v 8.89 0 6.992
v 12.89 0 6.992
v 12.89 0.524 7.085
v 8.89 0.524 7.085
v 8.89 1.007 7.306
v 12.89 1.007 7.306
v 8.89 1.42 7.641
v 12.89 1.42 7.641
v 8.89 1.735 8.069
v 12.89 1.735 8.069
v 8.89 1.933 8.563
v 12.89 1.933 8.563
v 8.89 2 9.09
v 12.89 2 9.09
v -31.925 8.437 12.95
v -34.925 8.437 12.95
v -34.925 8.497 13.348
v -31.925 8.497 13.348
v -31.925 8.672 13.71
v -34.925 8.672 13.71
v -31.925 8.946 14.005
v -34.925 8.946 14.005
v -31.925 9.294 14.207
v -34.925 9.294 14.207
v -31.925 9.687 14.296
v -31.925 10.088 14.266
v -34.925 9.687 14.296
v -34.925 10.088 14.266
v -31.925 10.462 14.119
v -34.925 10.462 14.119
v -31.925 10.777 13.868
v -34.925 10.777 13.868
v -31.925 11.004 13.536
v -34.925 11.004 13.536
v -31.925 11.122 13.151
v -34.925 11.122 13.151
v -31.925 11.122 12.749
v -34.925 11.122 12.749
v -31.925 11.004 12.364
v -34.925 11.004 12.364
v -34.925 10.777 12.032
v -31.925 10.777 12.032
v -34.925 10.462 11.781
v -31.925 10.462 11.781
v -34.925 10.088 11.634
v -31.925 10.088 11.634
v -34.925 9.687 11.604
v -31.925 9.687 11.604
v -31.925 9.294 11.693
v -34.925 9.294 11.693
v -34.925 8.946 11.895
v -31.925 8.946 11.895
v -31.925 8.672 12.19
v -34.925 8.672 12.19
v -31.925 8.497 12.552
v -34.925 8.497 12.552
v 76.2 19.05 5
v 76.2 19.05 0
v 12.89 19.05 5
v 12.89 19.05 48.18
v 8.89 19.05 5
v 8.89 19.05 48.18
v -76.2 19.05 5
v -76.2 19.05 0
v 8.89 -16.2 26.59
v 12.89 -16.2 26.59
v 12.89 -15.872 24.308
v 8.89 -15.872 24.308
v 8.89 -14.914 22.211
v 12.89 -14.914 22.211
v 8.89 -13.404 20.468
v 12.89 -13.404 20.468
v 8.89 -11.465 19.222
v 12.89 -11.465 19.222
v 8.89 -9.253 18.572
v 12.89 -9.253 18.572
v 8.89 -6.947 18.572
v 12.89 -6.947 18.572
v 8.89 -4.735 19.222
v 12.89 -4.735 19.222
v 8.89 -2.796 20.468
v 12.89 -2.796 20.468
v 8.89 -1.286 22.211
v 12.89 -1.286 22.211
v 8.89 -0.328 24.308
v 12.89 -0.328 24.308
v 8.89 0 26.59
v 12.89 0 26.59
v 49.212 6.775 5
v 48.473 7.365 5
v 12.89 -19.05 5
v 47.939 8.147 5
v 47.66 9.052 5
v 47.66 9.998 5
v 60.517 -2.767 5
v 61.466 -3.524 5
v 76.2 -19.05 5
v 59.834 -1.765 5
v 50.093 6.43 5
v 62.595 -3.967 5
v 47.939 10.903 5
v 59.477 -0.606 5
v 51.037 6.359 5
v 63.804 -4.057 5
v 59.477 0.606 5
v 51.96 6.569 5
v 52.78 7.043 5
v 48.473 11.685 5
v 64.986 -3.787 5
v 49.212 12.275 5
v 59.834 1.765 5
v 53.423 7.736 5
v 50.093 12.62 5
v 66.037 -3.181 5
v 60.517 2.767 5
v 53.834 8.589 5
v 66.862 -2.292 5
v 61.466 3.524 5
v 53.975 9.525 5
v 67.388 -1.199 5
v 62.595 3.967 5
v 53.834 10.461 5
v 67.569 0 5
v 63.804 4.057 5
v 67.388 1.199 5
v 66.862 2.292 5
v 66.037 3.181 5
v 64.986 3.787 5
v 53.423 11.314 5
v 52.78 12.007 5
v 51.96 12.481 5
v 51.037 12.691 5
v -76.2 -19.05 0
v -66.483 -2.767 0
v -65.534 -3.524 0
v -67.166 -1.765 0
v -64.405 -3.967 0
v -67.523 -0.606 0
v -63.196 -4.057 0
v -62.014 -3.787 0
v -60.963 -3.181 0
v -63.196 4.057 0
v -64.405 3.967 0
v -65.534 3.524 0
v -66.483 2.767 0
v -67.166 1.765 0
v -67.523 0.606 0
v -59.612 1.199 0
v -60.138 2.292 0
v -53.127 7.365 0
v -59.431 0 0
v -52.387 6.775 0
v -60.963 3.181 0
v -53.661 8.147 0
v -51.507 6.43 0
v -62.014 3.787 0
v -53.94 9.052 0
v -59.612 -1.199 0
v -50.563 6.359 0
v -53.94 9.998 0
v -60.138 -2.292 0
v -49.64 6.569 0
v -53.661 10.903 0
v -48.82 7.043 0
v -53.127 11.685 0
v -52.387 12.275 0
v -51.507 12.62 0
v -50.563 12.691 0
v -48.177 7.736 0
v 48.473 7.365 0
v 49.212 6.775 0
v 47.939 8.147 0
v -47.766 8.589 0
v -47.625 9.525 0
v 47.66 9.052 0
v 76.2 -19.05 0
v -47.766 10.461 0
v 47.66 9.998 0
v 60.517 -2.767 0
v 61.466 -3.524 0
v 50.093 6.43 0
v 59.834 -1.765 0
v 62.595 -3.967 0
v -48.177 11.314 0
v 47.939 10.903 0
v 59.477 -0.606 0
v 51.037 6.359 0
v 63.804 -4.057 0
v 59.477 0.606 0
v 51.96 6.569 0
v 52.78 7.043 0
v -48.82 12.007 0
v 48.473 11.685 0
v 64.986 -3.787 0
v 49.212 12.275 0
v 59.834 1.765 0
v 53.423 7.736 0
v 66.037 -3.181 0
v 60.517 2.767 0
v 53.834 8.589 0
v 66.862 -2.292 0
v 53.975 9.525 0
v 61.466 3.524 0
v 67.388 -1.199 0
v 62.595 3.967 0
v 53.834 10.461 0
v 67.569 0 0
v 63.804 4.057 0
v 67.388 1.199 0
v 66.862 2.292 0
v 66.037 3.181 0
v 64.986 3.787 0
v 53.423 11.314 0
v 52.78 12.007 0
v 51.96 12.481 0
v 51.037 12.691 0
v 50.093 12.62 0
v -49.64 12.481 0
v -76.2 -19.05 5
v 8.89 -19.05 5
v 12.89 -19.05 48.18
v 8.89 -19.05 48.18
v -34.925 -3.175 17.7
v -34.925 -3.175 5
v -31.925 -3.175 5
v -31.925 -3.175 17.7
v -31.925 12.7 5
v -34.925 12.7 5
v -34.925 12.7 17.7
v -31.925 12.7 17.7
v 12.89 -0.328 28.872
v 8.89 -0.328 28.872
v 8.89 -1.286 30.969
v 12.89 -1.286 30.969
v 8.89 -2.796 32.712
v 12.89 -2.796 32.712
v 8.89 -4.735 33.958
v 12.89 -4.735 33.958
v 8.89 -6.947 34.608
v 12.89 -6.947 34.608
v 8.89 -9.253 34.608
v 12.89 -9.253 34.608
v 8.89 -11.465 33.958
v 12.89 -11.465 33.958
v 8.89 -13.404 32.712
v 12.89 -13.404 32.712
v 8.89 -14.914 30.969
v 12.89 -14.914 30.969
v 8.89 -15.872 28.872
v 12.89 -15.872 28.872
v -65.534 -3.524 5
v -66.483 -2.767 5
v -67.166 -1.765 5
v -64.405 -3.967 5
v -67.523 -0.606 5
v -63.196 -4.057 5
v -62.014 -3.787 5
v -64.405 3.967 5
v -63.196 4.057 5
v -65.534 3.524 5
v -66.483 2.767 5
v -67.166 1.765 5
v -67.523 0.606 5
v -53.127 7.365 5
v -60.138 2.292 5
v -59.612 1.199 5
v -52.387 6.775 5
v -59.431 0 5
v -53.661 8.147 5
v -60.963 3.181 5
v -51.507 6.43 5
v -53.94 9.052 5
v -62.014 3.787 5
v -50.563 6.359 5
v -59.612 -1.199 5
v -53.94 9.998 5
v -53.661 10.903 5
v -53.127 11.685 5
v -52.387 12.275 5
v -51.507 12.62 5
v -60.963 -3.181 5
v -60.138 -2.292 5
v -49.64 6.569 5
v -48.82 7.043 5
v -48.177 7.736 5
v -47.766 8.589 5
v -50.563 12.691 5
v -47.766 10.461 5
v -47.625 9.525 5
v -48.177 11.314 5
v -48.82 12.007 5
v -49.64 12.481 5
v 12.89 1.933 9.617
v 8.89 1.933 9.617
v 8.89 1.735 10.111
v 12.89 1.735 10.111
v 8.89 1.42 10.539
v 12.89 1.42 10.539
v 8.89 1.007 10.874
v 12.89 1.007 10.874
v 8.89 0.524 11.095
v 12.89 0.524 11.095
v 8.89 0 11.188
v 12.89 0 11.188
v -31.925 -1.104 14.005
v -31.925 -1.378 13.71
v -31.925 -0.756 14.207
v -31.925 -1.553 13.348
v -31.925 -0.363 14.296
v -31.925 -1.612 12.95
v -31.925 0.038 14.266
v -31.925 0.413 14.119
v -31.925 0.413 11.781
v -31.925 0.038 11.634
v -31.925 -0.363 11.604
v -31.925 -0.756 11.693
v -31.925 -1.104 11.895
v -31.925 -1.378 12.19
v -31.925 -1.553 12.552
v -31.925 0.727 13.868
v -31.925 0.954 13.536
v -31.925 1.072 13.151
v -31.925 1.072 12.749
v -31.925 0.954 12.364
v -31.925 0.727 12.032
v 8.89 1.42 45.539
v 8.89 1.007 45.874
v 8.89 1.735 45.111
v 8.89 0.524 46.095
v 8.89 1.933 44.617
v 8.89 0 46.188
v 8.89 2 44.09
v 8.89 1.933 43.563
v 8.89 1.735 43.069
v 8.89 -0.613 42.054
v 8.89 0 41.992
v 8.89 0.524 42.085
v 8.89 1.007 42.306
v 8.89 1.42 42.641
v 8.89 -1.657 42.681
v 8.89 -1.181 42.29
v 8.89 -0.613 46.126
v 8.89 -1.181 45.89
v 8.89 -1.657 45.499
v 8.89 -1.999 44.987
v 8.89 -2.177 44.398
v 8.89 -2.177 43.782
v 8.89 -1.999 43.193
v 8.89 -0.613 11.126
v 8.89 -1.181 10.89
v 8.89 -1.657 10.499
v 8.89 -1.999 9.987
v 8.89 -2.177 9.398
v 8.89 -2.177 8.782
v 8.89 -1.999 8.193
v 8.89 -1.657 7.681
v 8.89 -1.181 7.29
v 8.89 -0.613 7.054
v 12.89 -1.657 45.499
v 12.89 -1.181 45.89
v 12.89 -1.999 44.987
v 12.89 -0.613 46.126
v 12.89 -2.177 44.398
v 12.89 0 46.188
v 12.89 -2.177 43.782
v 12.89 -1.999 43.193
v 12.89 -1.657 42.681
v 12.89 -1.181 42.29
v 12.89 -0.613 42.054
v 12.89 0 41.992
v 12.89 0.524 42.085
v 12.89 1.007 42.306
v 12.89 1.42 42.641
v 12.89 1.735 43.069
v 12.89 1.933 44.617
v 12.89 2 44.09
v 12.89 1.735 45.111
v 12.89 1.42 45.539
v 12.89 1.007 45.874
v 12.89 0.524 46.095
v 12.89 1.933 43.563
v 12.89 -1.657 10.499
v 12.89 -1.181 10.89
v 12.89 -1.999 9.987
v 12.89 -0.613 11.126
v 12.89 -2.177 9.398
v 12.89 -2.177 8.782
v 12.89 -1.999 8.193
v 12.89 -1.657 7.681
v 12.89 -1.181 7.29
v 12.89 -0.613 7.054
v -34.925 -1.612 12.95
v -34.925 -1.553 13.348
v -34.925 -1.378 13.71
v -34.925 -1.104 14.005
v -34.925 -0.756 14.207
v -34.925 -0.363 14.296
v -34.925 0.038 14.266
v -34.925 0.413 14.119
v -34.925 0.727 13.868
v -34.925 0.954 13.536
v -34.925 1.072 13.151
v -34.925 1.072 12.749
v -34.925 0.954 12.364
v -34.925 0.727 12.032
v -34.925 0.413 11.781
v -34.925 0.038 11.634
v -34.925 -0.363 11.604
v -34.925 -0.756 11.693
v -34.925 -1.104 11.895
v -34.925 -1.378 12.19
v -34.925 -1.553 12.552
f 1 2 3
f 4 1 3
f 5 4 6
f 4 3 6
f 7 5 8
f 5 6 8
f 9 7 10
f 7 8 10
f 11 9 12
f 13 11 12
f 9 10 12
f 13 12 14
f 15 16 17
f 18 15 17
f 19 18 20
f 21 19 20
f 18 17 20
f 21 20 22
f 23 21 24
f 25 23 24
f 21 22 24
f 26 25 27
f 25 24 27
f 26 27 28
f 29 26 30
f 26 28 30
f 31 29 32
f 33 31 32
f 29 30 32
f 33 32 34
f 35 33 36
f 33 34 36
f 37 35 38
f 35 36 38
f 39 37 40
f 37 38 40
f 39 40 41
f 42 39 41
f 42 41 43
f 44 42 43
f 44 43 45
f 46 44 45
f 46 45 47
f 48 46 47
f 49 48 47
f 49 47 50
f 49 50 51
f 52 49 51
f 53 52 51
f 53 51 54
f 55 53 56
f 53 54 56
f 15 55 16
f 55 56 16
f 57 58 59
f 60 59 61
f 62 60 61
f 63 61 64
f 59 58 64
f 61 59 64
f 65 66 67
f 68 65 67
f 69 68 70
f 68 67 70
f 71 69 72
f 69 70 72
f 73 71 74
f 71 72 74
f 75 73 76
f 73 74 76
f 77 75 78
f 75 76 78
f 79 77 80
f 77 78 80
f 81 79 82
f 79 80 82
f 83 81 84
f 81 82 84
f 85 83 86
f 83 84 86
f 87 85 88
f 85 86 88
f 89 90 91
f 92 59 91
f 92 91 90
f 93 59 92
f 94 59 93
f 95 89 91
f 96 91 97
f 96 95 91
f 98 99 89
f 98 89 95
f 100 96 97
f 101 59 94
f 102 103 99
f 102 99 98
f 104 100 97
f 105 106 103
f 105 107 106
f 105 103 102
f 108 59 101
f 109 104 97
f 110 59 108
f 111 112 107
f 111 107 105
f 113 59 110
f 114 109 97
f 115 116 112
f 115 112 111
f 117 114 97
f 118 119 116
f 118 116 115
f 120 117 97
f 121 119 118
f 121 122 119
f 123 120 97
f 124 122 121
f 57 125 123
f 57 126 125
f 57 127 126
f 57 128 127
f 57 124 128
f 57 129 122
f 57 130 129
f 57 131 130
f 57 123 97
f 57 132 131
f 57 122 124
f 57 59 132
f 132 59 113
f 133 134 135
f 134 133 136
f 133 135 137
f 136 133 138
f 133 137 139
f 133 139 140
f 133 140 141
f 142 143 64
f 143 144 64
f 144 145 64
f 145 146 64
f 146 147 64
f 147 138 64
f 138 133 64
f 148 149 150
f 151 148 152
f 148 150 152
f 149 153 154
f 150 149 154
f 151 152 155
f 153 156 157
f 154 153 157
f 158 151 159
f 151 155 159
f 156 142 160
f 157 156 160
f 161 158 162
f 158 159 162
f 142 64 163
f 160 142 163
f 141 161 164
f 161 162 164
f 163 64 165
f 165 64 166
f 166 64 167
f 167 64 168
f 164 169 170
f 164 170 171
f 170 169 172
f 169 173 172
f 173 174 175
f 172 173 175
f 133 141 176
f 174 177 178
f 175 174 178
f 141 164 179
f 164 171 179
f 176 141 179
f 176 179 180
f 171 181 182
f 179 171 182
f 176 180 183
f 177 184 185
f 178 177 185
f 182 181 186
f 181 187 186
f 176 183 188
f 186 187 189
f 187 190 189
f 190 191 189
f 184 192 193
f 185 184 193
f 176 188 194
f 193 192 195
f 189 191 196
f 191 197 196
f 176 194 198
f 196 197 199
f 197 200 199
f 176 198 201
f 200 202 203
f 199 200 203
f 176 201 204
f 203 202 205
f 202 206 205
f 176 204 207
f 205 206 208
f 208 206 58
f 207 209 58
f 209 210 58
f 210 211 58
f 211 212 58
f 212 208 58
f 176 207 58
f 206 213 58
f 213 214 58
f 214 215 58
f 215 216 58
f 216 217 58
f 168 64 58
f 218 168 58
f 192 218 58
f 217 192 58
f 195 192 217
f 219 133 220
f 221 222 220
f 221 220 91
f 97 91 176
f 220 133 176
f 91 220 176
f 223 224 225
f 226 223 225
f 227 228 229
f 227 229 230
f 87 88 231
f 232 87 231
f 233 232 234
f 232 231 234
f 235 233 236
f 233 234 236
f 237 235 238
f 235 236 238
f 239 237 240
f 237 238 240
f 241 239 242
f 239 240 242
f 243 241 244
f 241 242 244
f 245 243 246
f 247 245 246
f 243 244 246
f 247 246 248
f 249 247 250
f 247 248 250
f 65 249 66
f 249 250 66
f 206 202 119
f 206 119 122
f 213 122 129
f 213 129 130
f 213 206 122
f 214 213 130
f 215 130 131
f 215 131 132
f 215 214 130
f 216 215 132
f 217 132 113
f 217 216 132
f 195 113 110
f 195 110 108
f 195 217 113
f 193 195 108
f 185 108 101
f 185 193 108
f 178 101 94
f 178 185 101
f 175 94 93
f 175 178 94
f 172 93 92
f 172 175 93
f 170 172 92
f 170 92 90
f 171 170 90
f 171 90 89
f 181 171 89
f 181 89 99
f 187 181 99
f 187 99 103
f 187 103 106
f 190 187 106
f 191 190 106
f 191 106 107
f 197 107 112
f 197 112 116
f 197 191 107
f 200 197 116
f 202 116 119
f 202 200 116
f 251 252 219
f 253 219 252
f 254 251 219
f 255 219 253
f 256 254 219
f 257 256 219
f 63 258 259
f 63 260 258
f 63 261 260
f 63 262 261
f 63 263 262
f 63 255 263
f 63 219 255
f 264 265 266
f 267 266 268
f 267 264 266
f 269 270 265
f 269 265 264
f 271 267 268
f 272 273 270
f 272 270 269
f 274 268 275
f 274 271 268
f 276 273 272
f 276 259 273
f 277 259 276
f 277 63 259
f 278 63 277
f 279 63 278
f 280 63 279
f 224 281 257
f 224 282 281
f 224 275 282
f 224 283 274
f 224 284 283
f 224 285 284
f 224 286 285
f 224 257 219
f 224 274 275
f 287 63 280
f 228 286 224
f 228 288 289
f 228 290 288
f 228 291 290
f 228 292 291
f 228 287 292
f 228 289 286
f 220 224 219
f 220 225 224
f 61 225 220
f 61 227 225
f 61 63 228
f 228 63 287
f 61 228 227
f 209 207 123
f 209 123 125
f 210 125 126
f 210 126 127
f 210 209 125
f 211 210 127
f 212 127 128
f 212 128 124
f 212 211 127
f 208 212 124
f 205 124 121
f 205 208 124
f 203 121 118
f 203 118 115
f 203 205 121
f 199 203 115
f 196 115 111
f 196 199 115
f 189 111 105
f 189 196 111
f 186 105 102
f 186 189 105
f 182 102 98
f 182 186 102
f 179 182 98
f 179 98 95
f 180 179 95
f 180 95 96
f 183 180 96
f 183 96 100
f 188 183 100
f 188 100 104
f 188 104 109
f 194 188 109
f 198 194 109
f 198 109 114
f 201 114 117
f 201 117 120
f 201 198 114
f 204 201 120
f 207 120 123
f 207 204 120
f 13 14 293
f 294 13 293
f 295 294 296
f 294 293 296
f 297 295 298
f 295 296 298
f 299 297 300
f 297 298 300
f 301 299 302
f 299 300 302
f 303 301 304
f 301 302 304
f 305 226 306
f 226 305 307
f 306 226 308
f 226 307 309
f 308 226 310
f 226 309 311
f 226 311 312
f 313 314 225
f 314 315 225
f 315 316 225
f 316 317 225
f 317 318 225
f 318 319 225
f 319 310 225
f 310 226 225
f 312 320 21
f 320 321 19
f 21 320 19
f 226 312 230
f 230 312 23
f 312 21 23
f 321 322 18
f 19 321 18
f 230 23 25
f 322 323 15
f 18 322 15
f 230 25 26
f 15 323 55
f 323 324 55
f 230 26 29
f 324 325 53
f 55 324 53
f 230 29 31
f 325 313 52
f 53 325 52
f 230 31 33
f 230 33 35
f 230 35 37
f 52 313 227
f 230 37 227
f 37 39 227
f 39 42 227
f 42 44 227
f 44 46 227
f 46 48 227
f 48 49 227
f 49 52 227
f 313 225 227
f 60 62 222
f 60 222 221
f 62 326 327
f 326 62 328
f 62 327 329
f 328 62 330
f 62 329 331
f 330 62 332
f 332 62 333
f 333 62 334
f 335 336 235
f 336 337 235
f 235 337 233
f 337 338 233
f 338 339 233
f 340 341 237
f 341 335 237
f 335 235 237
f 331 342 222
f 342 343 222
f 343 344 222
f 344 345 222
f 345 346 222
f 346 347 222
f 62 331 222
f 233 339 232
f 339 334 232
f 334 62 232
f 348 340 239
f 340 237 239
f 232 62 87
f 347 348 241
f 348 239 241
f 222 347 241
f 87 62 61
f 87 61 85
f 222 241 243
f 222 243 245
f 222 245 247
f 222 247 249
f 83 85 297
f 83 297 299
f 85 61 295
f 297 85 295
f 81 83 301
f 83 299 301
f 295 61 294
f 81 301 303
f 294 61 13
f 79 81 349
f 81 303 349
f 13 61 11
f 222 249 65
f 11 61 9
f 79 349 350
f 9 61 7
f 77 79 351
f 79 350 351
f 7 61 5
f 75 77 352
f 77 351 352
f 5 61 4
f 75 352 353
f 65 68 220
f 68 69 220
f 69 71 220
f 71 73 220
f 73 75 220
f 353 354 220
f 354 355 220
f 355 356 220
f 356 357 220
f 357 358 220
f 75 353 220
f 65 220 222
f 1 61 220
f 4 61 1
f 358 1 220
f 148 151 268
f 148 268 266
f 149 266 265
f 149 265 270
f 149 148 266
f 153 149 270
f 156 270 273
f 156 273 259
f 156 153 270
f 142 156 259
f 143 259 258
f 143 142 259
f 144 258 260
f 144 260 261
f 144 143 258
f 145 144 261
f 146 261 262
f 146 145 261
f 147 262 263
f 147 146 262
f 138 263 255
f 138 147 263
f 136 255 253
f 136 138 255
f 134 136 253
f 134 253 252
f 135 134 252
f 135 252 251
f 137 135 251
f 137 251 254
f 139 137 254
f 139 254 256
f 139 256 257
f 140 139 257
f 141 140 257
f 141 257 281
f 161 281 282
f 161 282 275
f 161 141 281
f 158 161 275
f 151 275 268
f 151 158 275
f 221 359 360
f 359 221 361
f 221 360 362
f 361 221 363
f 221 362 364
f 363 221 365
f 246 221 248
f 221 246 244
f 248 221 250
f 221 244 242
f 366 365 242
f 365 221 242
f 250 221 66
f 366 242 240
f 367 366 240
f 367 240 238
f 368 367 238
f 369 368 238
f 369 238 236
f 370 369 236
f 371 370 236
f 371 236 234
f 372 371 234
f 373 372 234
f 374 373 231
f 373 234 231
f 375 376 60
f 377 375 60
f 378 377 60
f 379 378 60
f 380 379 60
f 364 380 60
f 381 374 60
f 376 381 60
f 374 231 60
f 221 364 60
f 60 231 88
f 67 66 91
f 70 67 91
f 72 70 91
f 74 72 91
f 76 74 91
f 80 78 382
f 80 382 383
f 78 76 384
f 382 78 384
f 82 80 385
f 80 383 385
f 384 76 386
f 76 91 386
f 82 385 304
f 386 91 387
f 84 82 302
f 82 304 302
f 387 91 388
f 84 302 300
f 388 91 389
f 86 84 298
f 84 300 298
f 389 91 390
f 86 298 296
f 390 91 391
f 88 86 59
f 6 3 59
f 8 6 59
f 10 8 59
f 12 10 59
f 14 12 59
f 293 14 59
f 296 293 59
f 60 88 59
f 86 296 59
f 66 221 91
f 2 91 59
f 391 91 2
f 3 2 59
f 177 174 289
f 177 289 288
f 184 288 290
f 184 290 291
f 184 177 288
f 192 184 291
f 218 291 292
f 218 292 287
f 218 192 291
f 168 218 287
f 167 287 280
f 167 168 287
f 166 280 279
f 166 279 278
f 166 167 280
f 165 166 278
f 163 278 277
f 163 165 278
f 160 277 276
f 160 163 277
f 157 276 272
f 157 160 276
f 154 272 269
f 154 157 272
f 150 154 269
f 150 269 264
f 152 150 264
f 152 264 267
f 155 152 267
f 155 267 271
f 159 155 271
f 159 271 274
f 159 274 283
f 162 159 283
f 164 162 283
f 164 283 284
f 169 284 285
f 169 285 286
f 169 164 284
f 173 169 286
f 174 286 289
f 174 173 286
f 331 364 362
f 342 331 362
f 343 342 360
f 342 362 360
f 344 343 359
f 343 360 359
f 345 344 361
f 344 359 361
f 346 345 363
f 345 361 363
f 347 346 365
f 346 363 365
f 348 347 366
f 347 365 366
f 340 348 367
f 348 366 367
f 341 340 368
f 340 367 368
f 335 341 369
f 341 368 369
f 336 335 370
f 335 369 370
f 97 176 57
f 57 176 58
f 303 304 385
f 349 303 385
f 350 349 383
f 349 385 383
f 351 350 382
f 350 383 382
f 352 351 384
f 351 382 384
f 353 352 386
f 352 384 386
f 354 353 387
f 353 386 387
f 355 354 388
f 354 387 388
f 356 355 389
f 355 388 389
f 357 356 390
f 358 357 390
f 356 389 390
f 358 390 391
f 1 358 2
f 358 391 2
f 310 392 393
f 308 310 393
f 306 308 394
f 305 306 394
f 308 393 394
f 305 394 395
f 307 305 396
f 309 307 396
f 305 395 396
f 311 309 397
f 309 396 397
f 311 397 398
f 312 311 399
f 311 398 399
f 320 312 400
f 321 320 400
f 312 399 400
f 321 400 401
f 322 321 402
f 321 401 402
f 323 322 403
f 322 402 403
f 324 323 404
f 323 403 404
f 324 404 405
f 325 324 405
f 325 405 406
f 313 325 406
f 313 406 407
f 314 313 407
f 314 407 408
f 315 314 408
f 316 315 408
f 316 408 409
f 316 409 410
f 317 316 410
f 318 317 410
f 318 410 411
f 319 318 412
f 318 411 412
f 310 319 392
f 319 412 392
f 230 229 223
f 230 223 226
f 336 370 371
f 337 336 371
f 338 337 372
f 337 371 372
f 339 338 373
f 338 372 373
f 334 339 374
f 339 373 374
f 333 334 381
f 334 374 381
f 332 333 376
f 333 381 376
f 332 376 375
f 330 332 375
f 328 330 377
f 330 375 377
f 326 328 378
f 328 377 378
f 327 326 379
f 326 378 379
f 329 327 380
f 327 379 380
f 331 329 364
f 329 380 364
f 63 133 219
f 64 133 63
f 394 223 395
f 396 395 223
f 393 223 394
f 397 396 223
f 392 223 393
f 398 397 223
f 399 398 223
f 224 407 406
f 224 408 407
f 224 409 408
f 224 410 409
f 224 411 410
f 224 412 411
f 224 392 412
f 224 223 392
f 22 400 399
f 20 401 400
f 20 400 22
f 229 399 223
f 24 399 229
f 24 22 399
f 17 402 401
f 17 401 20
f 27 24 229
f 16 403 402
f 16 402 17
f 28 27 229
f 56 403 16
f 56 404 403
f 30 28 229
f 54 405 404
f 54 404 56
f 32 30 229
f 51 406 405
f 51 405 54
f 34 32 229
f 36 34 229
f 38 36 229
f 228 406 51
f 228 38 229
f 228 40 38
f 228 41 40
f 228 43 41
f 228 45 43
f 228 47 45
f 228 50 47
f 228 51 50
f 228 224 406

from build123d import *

# Parameters (mm, degrees)
F0_W     = 76.2
F0_H     = 38.1
F0_R     = 4.06875
F0_R_2   = 3.175
F1_DEPTH = 5
F2_W     = 4
F2_H     = 19.05
F3_DEPTH = 43.18
F4_W     = 3
F4_H     = 15.875
F5_DEPTH = 12.7
F7_DEPTH = 4
F8_R     = 1.349997
F9_DEPTH = 3


with BuildPart() as f1:
    # F0 (on Top) → F1 (new body)
    with BuildSketch(Plane.XY):
        with Locations((38.1, 0)):
            Rectangle(F0_W, F0_H)
        with Locations((63.5, 0)):
            Circle(F0_R, mode=Mode.SUBTRACT)
        with Locations((50.8, 9.525)):
            Circle(F0_R_2, mode=Mode.SUBTRACT)
        with Locations((-38.1, 0)):
            Rectangle(F0_W, F0_H)
        with Locations((-63.5, 0)):
            Circle(F0_R, mode=Mode.SUBTRACT)
        with Locations((-50.8, 9.525)):
            Circle(F0_R_2, mode=Mode.SUBTRACT)
    extrude(amount=F1_DEPTH)

    # F2 (on face) → F3 (join)
    with BuildSketch(Plane.XY.offset(5)):
        with Locations((10.89, 9.525)):
            Rectangle(F2_W, F2_H)
        with Locations((10.89, -9.525)):
            Rectangle(F2_W, F2_H)
    extrude(amount=F3_DEPTH)

    # F4 (on face) → F5 (join)
    with BuildSketch(Plane.XY.offset(5)):
        with Locations((-33.425, 4.7625)):
            Rectangle(F4_W, F4_H)
    extrude(amount=F5_DEPTH)

    # F6 (on face) → F7 (cut, through all)
    with BuildSketch(Plane.YZ.offset(12.89)):
        with BuildLine():
            Line((-8.099996, 26.59), (1.3e-05, 26.59))
            ThreePointArc((1.3e-05, 26.59), (-8.099996, 34.690009), (-16.200006, 26.59))
            Line((-16.200006, 26.59), (-8.099996, 26.59))
        make_face()
        with BuildLine():
            ThreePointArc((-16.200006, 26.59), (-8.099996, 18.489991), (1.3e-05, 26.59))
            Line((1.3e-05, 26.59), (-8.099996, 26.59))
            Line((-8.099996, 26.59), (-16.200006, 26.59))
        make_face()
        with BuildLine():
            ThreePointArc((0, 46.187605), (-2.199983, 44.08999), (0, 41.992376))
            Line((0, 41.992376), (0, 46.187605))
        make_face()
        with BuildLine():
            Line((0, 46.187605), (0, 41.992376))
            ThreePointArc((0, 41.992376), (1.419874, 42.640851), (2.000009, 44.08999))
            ThreePointArc((2.000009, 44.08999), (1.419874, 45.53913), (0, 46.187605))
        make_face()
        with BuildLine():
            ThreePointArc((2.000009, 9.09001), (1.419874, 10.539149), (0, 11.187624))
            Line((0, 11.187624), (0, 6.992395))
            ThreePointArc((0, 6.992395), (1.419874, 7.64087), (2.000009, 9.09001))
        make_face()
        with BuildLine():
            Line((0, 6.992395), (0, 11.187624))
            ThreePointArc((0, 11.187624), (-2.199983, 9.09001), (0, 6.992395))
        make_face()
    extrude(amount=-F7_DEPTH, mode=Mode.SUBTRACT)

    # F8 (on face) → F9 (cut, through all)
    with BuildSketch(Plane(origin=(-34.925, 0, 0), x_dir=(0, -1, 0), z_dir=(-1, 0, 0))):
        with Locations((-9.787496, 12.949984)):
            Circle(F8_R)
        with Locations((0.262496, 12.949984)):
            Circle(F8_R)
    extrude(amount=-F9_DEPTH, mode=Mode.SUBTRACT)


solid = f1.part
